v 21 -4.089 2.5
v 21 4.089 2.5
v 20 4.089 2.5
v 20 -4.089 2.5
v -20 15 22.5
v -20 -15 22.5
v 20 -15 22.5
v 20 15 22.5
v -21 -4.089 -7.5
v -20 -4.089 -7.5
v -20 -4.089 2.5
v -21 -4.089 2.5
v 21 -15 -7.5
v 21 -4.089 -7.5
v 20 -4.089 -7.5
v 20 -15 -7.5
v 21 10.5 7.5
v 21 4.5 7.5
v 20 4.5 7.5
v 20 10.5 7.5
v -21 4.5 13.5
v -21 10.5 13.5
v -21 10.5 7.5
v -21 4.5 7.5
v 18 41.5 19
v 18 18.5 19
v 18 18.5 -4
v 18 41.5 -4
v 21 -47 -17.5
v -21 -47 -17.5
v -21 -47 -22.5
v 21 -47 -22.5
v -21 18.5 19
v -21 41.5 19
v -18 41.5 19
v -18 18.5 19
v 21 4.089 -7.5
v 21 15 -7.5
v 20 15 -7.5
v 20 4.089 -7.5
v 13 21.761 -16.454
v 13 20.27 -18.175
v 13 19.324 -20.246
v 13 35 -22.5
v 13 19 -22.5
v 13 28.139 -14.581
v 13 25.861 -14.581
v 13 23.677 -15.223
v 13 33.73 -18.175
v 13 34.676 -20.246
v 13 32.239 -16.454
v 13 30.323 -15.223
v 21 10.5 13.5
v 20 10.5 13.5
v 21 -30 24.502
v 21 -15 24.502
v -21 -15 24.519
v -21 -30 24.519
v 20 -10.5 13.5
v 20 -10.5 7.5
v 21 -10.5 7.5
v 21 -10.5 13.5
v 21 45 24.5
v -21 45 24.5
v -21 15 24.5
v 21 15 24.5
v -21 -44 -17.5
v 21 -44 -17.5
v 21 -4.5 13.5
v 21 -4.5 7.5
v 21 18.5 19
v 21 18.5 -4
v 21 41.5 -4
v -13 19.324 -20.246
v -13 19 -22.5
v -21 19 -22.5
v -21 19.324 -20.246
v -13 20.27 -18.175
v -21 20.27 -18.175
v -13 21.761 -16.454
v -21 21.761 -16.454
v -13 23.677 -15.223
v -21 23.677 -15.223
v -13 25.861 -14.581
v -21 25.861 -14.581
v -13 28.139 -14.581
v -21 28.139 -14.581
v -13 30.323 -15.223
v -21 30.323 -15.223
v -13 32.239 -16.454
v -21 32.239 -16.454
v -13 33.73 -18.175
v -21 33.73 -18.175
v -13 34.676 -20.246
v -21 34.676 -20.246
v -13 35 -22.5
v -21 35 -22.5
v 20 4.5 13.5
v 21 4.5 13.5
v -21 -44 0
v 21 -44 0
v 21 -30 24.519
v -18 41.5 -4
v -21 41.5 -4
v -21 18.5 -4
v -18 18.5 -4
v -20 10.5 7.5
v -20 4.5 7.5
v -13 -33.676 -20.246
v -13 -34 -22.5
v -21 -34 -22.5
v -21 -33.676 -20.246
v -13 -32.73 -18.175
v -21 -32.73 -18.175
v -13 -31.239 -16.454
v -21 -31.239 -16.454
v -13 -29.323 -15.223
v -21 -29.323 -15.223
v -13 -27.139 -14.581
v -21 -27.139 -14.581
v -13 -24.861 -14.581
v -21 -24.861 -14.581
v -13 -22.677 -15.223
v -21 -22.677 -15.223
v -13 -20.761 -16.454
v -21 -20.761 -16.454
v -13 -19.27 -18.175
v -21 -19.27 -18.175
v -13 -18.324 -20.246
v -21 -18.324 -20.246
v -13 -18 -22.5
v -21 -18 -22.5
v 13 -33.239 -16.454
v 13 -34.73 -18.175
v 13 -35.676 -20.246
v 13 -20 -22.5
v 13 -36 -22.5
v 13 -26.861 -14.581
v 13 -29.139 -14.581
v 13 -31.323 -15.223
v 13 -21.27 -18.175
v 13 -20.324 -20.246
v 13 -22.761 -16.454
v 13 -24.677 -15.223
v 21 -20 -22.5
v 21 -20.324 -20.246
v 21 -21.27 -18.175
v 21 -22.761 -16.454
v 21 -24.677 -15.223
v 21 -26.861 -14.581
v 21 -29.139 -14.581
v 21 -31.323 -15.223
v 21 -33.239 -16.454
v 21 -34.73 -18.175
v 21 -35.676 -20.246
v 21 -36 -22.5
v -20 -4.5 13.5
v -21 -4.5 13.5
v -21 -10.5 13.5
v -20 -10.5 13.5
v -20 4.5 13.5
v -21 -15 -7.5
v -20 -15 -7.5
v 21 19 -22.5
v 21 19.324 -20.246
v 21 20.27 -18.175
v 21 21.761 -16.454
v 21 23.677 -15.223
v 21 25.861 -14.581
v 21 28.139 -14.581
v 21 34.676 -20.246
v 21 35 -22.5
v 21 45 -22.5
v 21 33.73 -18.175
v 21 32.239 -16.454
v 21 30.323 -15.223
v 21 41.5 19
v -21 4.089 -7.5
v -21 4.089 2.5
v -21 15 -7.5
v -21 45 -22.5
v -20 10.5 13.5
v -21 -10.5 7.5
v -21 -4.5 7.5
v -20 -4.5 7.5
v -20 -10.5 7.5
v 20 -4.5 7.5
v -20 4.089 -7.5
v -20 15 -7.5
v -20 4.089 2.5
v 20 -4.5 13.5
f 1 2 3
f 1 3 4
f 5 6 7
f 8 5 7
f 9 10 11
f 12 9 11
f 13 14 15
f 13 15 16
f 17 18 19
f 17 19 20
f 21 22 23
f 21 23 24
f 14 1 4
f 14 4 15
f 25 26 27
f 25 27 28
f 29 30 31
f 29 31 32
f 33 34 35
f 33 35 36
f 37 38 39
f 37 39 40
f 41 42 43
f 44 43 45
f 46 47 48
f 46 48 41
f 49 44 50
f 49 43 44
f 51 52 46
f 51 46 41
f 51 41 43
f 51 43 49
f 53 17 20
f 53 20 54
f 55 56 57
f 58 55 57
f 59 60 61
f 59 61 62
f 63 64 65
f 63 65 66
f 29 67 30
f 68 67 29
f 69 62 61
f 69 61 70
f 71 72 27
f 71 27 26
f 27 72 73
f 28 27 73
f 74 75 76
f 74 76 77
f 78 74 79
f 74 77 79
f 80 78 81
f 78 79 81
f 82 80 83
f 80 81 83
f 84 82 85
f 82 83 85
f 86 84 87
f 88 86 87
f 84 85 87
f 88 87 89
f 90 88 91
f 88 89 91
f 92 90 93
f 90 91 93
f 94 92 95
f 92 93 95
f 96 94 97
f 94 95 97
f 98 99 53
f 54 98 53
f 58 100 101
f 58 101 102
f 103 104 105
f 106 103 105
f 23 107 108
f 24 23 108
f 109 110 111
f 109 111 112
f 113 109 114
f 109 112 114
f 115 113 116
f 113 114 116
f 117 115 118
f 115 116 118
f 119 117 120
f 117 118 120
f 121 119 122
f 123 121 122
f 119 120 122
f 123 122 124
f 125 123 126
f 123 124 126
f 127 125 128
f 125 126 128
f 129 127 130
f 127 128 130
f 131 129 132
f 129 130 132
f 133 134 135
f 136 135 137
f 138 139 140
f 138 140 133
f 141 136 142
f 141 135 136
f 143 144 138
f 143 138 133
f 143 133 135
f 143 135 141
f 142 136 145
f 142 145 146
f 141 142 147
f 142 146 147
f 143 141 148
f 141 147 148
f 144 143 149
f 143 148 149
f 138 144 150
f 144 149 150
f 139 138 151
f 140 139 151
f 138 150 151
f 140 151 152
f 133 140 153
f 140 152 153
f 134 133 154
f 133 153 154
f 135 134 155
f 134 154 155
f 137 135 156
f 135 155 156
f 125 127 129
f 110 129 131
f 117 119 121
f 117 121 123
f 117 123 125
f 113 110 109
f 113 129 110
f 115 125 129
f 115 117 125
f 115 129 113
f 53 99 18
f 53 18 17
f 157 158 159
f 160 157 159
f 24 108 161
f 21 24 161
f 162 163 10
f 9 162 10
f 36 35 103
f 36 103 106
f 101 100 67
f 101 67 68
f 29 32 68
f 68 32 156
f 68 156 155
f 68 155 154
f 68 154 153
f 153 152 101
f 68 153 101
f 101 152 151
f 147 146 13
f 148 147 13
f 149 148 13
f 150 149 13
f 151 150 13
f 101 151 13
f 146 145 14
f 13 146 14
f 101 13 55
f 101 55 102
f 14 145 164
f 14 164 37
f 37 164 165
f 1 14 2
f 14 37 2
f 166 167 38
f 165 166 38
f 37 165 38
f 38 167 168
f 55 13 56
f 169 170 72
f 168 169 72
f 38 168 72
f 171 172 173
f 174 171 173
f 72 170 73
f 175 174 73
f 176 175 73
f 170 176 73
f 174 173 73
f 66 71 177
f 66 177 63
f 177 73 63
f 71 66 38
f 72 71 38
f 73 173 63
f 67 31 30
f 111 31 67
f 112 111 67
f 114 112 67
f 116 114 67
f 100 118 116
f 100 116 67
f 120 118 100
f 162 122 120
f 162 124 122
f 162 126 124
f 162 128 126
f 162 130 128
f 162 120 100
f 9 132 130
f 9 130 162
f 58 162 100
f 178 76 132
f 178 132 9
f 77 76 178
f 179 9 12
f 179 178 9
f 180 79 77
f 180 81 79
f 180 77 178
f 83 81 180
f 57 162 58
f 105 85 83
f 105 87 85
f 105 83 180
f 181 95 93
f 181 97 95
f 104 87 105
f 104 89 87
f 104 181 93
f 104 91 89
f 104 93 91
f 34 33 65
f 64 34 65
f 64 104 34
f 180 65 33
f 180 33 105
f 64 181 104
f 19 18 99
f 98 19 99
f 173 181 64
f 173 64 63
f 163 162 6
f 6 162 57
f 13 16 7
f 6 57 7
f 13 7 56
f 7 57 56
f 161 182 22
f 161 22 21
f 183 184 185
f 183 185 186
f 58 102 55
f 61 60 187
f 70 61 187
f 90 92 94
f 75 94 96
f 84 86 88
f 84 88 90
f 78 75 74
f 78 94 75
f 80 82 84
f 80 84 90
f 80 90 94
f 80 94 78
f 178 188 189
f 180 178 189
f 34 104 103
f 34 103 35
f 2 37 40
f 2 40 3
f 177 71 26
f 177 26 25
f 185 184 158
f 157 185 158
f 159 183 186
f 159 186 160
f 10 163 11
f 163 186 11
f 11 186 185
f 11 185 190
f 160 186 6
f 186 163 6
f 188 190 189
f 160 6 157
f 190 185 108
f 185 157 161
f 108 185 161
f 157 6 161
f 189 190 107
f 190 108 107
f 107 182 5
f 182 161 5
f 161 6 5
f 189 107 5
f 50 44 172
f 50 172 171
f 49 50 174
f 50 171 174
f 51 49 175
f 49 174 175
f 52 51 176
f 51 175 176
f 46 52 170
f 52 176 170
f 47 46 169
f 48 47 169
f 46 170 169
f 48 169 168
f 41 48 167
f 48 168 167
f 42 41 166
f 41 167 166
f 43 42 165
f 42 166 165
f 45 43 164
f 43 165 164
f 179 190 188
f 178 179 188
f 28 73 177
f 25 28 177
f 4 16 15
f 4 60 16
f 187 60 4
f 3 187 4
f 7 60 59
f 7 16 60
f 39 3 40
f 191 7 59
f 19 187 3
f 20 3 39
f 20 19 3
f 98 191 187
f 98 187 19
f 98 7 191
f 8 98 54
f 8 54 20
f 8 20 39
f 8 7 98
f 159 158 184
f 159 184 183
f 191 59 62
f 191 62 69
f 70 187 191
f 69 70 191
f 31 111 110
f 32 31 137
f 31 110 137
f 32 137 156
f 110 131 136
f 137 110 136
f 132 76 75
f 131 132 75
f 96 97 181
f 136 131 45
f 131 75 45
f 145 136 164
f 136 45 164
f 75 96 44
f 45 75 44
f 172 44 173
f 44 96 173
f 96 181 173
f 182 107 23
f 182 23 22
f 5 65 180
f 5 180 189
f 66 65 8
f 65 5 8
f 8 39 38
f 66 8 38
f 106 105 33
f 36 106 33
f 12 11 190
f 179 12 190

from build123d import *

# Parameters (mm, degrees)
F0_W      = 30
F0_H      = 45
F1_DEPTH  = 20
F2_W      = 6
F2_H      = 6
F3_DEPTH  = 1
F5_DEPTH  = 1
F6_W      = 1
F6_H      = 30
F7_DEPTH  = 30
F8_W      = 23
F8_H      = 23
F9_DEPTH  = 3
F10_W     = 23
F10_H     = 23
F11_DEPTH = 3
F12_W     = 42
F12_H     = 30
F13_DEPTH = 2
F14_R     = 8
F15_DEPTH = 8
F17_DEPTH = 15
F18_W     = 42
F18_H     = 22.5
F19_DEPTH = 14
F21_R     = 8
F22_DEPTH = 8
F23_DEPTH = 42
F24_DEPTH = 1
F25_R     = 8
F26_DEPTH = 8
F27_R     = 8
F28_DEPTH = 8
F29_W     = 6
F29_H     = 6
F30_DEPTH = 1
F31_W     = 42
F31_H     = 5
F32_DEPTH = 3


with BuildPart() as f1:
    # F0 (on Right) → F1 (new body, symmetric)
    with BuildSketch(Plane.YZ):
        Rectangle(F0_W, F0_H)
    extrude(amount=F1_DEPTH, both=True)

    # F2 (on face) → F3 (join, symmetric)
    with BuildSketch(Plane(origin=(-20, 0, 0), x_dir=(0, -1, 0), z_dir=(-1, 0, 0))):
        Polygon((-15, -7.5), (-15, -22.5), (15, -22.5), (15, -7.5), (4.0889219381, -7.5), (4.0889219381, 2.5), (-4.0889219381, 2.5), (-4.0889219381, -7.5), align=None)
        with Locations((-7.5, 10.5)):
            Rectangle(F2_W, F2_H)
        with Locations((7.5, 10.5)):
            Rectangle(F2_W, F2_H)
    extrude(amount=F3_DEPTH, both=True)

    # F4 (on face) → F5 (join, symmetric)
    with BuildSketch(Plane.YZ.offset(20)):
        Polygon((-4.0889219381, -7.5), (-15, -7.5), (-15, -22.5), (15, -22.5), (15, -7.5), (4.0889219381, -7.5), (4.0889219381, 2.5), (-4.0889219381, 2.5), align=None)
    extrude(amount=F5_DEPTH, both=True)

    # F6 (on face) → F7 (join)
    with BuildSketch(Plane(origin=(0, 15, 0), x_dir=(-1, 0, 0), z_dir=(0, 1, 0))):
        with Locations((20.5, 7.5)):
            Rectangle(F6_W, F6_H)
        Polygon((-21, -22.5), (21, -22.5), (21, -7.5), (20, -7.5), (20, 22.5), (-20, 22.5), (-20, -7.5), (-21, -7.5), align=None)
        with Locations((-20.5, 7.5)):
            Rectangle(F6_W, F6_H)
    extrude(amount=F7_DEPTH)

    # F8 (on face) → F9 (cut)
    with BuildSketch(Plane(origin=(-21, 0, 0), x_dir=(0, -1, 0), z_dir=(-1, 0, 0))):
        with Locations((-30, 7.5)):
            Rectangle(F8_W, F8_H)
    extrude(amount=-F9_DEPTH, mode=Mode.SUBTRACT)

    # F10 (on face) → F11 (cut)
    with BuildSketch(Plane.YZ.offset(21)):
        with Locations((30, 7.5)):
            Rectangle(F10_W, F10_H)
    extrude(amount=-F11_DEPTH, mode=Mode.SUBTRACT)

    # F12 (on face) → F13 (join)
    with BuildSketch(Plane.XY.offset(22.5)):
        with Locations((0, 30)):
            Rectangle(F12_W, F12_H)
    extrude(amount=F13_DEPTH)

    # F14 (on face) → F15 (cut)
    with BuildSketch(Plane(origin=(-21, 0, 0), x_dir=(0, -1, 0), z_dir=(-1, 0, 0))):
        with Locations((-27, -22.5)):
            Circle(F14_R)
    extrude(amount=-F15_DEPTH, mode=Mode.SUBTRACT)

    # F16 (on face) → F17 (join)
    with BuildSketch(Plane.XZ.offset(15)):
        Polygon((-21, 24.5194389681), (-21, -22.5), (21, -22.5), (21, 24.5022866875), align=None)
    extrude(amount=F17_DEPTH)

    # F18 (on face) → F19 (join)
    with BuildSketch(Plane.XZ.offset(30)):
        with Locations((0, -11.25)):
            Rectangle(F18_W, F18_H)
    extrude(amount=F19_DEPTH)

    # F21 (on face) → F22 (cut)
    with BuildSketch(Plane.YZ.offset(21)):
        with Locations((27, -22.5)):
            Circle(F21_R)
    extrude(amount=-F22_DEPTH, mode=Mode.SUBTRACT)

    # F20 (on face) → F23 (join)
    with BuildSketch(Plane(origin=(-21, 0, 0), x_dir=(0, -1, 0), z_dir=(-1, 0, 0))):
        Polygon((44, 0), (30, 24.5194389681), (30, 0), align=None)
    extrude(amount=-F23_DEPTH)

    # F2 (on face) → F24 (join)
    with BuildSketch(Plane(origin=(-20, 0, 0), x_dir=(0, -1, 0), z_dir=(-1, 0, 0))):
        Polygon((-15, -7.5), (-15, -22.5), (15, -22.5), (15, -7.5), (4.0889219381, -7.5), (4.0889219381, 2.5), (-4.0889219381, 2.5), (-4.0889219381, -7.5), align=None)
        with Locations((-7.5, 10.5)):
            Rectangle(F2_W, F2_H)
        with Locations((7.5, 10.5)):
            Rectangle(F2_W, F2_H)
    extrude(amount=F24_DEPTH)

    # F25 (on face) → F26 (cut)
    with BuildSketch(Plane(origin=(-21, 0, 0), x_dir=(0, -1, 0), z_dir=(-1, 0, 0))):
        with Locations((26, -22.5)):
            Circle(F25_R)
    extrude(amount=-F26_DEPTH, mode=Mode.SUBTRACT)

    # F27 (on face) → F28 (cut)
    with BuildSketch(Plane.YZ.offset(21)):
        with Locations((-28, -22.5)):
            Circle(F27_R)
    extrude(amount=-F28_DEPTH, mode=Mode.SUBTRACT)

    # F29 (on face) → F30 (join, symmetric)
    with BuildSketch(Plane.YZ.offset(20)):
        with Locations((-7.5, 10.5)):
            Rectangle(F29_W, F29_H)
        with Locations((7.5, 10.5)):
            Rectangle(F29_W, F29_H)
    extrude(amount=F30_DEPTH, both=True)

    # F31 (on face) → F32 (join)
    with BuildSketch(Plane.XZ.offset(44)):
        with Locations((0, -20)):
            Rectangle(F31_W, F31_H)
    extrude(amount=F32_DEPTH)


solid = f1.part
